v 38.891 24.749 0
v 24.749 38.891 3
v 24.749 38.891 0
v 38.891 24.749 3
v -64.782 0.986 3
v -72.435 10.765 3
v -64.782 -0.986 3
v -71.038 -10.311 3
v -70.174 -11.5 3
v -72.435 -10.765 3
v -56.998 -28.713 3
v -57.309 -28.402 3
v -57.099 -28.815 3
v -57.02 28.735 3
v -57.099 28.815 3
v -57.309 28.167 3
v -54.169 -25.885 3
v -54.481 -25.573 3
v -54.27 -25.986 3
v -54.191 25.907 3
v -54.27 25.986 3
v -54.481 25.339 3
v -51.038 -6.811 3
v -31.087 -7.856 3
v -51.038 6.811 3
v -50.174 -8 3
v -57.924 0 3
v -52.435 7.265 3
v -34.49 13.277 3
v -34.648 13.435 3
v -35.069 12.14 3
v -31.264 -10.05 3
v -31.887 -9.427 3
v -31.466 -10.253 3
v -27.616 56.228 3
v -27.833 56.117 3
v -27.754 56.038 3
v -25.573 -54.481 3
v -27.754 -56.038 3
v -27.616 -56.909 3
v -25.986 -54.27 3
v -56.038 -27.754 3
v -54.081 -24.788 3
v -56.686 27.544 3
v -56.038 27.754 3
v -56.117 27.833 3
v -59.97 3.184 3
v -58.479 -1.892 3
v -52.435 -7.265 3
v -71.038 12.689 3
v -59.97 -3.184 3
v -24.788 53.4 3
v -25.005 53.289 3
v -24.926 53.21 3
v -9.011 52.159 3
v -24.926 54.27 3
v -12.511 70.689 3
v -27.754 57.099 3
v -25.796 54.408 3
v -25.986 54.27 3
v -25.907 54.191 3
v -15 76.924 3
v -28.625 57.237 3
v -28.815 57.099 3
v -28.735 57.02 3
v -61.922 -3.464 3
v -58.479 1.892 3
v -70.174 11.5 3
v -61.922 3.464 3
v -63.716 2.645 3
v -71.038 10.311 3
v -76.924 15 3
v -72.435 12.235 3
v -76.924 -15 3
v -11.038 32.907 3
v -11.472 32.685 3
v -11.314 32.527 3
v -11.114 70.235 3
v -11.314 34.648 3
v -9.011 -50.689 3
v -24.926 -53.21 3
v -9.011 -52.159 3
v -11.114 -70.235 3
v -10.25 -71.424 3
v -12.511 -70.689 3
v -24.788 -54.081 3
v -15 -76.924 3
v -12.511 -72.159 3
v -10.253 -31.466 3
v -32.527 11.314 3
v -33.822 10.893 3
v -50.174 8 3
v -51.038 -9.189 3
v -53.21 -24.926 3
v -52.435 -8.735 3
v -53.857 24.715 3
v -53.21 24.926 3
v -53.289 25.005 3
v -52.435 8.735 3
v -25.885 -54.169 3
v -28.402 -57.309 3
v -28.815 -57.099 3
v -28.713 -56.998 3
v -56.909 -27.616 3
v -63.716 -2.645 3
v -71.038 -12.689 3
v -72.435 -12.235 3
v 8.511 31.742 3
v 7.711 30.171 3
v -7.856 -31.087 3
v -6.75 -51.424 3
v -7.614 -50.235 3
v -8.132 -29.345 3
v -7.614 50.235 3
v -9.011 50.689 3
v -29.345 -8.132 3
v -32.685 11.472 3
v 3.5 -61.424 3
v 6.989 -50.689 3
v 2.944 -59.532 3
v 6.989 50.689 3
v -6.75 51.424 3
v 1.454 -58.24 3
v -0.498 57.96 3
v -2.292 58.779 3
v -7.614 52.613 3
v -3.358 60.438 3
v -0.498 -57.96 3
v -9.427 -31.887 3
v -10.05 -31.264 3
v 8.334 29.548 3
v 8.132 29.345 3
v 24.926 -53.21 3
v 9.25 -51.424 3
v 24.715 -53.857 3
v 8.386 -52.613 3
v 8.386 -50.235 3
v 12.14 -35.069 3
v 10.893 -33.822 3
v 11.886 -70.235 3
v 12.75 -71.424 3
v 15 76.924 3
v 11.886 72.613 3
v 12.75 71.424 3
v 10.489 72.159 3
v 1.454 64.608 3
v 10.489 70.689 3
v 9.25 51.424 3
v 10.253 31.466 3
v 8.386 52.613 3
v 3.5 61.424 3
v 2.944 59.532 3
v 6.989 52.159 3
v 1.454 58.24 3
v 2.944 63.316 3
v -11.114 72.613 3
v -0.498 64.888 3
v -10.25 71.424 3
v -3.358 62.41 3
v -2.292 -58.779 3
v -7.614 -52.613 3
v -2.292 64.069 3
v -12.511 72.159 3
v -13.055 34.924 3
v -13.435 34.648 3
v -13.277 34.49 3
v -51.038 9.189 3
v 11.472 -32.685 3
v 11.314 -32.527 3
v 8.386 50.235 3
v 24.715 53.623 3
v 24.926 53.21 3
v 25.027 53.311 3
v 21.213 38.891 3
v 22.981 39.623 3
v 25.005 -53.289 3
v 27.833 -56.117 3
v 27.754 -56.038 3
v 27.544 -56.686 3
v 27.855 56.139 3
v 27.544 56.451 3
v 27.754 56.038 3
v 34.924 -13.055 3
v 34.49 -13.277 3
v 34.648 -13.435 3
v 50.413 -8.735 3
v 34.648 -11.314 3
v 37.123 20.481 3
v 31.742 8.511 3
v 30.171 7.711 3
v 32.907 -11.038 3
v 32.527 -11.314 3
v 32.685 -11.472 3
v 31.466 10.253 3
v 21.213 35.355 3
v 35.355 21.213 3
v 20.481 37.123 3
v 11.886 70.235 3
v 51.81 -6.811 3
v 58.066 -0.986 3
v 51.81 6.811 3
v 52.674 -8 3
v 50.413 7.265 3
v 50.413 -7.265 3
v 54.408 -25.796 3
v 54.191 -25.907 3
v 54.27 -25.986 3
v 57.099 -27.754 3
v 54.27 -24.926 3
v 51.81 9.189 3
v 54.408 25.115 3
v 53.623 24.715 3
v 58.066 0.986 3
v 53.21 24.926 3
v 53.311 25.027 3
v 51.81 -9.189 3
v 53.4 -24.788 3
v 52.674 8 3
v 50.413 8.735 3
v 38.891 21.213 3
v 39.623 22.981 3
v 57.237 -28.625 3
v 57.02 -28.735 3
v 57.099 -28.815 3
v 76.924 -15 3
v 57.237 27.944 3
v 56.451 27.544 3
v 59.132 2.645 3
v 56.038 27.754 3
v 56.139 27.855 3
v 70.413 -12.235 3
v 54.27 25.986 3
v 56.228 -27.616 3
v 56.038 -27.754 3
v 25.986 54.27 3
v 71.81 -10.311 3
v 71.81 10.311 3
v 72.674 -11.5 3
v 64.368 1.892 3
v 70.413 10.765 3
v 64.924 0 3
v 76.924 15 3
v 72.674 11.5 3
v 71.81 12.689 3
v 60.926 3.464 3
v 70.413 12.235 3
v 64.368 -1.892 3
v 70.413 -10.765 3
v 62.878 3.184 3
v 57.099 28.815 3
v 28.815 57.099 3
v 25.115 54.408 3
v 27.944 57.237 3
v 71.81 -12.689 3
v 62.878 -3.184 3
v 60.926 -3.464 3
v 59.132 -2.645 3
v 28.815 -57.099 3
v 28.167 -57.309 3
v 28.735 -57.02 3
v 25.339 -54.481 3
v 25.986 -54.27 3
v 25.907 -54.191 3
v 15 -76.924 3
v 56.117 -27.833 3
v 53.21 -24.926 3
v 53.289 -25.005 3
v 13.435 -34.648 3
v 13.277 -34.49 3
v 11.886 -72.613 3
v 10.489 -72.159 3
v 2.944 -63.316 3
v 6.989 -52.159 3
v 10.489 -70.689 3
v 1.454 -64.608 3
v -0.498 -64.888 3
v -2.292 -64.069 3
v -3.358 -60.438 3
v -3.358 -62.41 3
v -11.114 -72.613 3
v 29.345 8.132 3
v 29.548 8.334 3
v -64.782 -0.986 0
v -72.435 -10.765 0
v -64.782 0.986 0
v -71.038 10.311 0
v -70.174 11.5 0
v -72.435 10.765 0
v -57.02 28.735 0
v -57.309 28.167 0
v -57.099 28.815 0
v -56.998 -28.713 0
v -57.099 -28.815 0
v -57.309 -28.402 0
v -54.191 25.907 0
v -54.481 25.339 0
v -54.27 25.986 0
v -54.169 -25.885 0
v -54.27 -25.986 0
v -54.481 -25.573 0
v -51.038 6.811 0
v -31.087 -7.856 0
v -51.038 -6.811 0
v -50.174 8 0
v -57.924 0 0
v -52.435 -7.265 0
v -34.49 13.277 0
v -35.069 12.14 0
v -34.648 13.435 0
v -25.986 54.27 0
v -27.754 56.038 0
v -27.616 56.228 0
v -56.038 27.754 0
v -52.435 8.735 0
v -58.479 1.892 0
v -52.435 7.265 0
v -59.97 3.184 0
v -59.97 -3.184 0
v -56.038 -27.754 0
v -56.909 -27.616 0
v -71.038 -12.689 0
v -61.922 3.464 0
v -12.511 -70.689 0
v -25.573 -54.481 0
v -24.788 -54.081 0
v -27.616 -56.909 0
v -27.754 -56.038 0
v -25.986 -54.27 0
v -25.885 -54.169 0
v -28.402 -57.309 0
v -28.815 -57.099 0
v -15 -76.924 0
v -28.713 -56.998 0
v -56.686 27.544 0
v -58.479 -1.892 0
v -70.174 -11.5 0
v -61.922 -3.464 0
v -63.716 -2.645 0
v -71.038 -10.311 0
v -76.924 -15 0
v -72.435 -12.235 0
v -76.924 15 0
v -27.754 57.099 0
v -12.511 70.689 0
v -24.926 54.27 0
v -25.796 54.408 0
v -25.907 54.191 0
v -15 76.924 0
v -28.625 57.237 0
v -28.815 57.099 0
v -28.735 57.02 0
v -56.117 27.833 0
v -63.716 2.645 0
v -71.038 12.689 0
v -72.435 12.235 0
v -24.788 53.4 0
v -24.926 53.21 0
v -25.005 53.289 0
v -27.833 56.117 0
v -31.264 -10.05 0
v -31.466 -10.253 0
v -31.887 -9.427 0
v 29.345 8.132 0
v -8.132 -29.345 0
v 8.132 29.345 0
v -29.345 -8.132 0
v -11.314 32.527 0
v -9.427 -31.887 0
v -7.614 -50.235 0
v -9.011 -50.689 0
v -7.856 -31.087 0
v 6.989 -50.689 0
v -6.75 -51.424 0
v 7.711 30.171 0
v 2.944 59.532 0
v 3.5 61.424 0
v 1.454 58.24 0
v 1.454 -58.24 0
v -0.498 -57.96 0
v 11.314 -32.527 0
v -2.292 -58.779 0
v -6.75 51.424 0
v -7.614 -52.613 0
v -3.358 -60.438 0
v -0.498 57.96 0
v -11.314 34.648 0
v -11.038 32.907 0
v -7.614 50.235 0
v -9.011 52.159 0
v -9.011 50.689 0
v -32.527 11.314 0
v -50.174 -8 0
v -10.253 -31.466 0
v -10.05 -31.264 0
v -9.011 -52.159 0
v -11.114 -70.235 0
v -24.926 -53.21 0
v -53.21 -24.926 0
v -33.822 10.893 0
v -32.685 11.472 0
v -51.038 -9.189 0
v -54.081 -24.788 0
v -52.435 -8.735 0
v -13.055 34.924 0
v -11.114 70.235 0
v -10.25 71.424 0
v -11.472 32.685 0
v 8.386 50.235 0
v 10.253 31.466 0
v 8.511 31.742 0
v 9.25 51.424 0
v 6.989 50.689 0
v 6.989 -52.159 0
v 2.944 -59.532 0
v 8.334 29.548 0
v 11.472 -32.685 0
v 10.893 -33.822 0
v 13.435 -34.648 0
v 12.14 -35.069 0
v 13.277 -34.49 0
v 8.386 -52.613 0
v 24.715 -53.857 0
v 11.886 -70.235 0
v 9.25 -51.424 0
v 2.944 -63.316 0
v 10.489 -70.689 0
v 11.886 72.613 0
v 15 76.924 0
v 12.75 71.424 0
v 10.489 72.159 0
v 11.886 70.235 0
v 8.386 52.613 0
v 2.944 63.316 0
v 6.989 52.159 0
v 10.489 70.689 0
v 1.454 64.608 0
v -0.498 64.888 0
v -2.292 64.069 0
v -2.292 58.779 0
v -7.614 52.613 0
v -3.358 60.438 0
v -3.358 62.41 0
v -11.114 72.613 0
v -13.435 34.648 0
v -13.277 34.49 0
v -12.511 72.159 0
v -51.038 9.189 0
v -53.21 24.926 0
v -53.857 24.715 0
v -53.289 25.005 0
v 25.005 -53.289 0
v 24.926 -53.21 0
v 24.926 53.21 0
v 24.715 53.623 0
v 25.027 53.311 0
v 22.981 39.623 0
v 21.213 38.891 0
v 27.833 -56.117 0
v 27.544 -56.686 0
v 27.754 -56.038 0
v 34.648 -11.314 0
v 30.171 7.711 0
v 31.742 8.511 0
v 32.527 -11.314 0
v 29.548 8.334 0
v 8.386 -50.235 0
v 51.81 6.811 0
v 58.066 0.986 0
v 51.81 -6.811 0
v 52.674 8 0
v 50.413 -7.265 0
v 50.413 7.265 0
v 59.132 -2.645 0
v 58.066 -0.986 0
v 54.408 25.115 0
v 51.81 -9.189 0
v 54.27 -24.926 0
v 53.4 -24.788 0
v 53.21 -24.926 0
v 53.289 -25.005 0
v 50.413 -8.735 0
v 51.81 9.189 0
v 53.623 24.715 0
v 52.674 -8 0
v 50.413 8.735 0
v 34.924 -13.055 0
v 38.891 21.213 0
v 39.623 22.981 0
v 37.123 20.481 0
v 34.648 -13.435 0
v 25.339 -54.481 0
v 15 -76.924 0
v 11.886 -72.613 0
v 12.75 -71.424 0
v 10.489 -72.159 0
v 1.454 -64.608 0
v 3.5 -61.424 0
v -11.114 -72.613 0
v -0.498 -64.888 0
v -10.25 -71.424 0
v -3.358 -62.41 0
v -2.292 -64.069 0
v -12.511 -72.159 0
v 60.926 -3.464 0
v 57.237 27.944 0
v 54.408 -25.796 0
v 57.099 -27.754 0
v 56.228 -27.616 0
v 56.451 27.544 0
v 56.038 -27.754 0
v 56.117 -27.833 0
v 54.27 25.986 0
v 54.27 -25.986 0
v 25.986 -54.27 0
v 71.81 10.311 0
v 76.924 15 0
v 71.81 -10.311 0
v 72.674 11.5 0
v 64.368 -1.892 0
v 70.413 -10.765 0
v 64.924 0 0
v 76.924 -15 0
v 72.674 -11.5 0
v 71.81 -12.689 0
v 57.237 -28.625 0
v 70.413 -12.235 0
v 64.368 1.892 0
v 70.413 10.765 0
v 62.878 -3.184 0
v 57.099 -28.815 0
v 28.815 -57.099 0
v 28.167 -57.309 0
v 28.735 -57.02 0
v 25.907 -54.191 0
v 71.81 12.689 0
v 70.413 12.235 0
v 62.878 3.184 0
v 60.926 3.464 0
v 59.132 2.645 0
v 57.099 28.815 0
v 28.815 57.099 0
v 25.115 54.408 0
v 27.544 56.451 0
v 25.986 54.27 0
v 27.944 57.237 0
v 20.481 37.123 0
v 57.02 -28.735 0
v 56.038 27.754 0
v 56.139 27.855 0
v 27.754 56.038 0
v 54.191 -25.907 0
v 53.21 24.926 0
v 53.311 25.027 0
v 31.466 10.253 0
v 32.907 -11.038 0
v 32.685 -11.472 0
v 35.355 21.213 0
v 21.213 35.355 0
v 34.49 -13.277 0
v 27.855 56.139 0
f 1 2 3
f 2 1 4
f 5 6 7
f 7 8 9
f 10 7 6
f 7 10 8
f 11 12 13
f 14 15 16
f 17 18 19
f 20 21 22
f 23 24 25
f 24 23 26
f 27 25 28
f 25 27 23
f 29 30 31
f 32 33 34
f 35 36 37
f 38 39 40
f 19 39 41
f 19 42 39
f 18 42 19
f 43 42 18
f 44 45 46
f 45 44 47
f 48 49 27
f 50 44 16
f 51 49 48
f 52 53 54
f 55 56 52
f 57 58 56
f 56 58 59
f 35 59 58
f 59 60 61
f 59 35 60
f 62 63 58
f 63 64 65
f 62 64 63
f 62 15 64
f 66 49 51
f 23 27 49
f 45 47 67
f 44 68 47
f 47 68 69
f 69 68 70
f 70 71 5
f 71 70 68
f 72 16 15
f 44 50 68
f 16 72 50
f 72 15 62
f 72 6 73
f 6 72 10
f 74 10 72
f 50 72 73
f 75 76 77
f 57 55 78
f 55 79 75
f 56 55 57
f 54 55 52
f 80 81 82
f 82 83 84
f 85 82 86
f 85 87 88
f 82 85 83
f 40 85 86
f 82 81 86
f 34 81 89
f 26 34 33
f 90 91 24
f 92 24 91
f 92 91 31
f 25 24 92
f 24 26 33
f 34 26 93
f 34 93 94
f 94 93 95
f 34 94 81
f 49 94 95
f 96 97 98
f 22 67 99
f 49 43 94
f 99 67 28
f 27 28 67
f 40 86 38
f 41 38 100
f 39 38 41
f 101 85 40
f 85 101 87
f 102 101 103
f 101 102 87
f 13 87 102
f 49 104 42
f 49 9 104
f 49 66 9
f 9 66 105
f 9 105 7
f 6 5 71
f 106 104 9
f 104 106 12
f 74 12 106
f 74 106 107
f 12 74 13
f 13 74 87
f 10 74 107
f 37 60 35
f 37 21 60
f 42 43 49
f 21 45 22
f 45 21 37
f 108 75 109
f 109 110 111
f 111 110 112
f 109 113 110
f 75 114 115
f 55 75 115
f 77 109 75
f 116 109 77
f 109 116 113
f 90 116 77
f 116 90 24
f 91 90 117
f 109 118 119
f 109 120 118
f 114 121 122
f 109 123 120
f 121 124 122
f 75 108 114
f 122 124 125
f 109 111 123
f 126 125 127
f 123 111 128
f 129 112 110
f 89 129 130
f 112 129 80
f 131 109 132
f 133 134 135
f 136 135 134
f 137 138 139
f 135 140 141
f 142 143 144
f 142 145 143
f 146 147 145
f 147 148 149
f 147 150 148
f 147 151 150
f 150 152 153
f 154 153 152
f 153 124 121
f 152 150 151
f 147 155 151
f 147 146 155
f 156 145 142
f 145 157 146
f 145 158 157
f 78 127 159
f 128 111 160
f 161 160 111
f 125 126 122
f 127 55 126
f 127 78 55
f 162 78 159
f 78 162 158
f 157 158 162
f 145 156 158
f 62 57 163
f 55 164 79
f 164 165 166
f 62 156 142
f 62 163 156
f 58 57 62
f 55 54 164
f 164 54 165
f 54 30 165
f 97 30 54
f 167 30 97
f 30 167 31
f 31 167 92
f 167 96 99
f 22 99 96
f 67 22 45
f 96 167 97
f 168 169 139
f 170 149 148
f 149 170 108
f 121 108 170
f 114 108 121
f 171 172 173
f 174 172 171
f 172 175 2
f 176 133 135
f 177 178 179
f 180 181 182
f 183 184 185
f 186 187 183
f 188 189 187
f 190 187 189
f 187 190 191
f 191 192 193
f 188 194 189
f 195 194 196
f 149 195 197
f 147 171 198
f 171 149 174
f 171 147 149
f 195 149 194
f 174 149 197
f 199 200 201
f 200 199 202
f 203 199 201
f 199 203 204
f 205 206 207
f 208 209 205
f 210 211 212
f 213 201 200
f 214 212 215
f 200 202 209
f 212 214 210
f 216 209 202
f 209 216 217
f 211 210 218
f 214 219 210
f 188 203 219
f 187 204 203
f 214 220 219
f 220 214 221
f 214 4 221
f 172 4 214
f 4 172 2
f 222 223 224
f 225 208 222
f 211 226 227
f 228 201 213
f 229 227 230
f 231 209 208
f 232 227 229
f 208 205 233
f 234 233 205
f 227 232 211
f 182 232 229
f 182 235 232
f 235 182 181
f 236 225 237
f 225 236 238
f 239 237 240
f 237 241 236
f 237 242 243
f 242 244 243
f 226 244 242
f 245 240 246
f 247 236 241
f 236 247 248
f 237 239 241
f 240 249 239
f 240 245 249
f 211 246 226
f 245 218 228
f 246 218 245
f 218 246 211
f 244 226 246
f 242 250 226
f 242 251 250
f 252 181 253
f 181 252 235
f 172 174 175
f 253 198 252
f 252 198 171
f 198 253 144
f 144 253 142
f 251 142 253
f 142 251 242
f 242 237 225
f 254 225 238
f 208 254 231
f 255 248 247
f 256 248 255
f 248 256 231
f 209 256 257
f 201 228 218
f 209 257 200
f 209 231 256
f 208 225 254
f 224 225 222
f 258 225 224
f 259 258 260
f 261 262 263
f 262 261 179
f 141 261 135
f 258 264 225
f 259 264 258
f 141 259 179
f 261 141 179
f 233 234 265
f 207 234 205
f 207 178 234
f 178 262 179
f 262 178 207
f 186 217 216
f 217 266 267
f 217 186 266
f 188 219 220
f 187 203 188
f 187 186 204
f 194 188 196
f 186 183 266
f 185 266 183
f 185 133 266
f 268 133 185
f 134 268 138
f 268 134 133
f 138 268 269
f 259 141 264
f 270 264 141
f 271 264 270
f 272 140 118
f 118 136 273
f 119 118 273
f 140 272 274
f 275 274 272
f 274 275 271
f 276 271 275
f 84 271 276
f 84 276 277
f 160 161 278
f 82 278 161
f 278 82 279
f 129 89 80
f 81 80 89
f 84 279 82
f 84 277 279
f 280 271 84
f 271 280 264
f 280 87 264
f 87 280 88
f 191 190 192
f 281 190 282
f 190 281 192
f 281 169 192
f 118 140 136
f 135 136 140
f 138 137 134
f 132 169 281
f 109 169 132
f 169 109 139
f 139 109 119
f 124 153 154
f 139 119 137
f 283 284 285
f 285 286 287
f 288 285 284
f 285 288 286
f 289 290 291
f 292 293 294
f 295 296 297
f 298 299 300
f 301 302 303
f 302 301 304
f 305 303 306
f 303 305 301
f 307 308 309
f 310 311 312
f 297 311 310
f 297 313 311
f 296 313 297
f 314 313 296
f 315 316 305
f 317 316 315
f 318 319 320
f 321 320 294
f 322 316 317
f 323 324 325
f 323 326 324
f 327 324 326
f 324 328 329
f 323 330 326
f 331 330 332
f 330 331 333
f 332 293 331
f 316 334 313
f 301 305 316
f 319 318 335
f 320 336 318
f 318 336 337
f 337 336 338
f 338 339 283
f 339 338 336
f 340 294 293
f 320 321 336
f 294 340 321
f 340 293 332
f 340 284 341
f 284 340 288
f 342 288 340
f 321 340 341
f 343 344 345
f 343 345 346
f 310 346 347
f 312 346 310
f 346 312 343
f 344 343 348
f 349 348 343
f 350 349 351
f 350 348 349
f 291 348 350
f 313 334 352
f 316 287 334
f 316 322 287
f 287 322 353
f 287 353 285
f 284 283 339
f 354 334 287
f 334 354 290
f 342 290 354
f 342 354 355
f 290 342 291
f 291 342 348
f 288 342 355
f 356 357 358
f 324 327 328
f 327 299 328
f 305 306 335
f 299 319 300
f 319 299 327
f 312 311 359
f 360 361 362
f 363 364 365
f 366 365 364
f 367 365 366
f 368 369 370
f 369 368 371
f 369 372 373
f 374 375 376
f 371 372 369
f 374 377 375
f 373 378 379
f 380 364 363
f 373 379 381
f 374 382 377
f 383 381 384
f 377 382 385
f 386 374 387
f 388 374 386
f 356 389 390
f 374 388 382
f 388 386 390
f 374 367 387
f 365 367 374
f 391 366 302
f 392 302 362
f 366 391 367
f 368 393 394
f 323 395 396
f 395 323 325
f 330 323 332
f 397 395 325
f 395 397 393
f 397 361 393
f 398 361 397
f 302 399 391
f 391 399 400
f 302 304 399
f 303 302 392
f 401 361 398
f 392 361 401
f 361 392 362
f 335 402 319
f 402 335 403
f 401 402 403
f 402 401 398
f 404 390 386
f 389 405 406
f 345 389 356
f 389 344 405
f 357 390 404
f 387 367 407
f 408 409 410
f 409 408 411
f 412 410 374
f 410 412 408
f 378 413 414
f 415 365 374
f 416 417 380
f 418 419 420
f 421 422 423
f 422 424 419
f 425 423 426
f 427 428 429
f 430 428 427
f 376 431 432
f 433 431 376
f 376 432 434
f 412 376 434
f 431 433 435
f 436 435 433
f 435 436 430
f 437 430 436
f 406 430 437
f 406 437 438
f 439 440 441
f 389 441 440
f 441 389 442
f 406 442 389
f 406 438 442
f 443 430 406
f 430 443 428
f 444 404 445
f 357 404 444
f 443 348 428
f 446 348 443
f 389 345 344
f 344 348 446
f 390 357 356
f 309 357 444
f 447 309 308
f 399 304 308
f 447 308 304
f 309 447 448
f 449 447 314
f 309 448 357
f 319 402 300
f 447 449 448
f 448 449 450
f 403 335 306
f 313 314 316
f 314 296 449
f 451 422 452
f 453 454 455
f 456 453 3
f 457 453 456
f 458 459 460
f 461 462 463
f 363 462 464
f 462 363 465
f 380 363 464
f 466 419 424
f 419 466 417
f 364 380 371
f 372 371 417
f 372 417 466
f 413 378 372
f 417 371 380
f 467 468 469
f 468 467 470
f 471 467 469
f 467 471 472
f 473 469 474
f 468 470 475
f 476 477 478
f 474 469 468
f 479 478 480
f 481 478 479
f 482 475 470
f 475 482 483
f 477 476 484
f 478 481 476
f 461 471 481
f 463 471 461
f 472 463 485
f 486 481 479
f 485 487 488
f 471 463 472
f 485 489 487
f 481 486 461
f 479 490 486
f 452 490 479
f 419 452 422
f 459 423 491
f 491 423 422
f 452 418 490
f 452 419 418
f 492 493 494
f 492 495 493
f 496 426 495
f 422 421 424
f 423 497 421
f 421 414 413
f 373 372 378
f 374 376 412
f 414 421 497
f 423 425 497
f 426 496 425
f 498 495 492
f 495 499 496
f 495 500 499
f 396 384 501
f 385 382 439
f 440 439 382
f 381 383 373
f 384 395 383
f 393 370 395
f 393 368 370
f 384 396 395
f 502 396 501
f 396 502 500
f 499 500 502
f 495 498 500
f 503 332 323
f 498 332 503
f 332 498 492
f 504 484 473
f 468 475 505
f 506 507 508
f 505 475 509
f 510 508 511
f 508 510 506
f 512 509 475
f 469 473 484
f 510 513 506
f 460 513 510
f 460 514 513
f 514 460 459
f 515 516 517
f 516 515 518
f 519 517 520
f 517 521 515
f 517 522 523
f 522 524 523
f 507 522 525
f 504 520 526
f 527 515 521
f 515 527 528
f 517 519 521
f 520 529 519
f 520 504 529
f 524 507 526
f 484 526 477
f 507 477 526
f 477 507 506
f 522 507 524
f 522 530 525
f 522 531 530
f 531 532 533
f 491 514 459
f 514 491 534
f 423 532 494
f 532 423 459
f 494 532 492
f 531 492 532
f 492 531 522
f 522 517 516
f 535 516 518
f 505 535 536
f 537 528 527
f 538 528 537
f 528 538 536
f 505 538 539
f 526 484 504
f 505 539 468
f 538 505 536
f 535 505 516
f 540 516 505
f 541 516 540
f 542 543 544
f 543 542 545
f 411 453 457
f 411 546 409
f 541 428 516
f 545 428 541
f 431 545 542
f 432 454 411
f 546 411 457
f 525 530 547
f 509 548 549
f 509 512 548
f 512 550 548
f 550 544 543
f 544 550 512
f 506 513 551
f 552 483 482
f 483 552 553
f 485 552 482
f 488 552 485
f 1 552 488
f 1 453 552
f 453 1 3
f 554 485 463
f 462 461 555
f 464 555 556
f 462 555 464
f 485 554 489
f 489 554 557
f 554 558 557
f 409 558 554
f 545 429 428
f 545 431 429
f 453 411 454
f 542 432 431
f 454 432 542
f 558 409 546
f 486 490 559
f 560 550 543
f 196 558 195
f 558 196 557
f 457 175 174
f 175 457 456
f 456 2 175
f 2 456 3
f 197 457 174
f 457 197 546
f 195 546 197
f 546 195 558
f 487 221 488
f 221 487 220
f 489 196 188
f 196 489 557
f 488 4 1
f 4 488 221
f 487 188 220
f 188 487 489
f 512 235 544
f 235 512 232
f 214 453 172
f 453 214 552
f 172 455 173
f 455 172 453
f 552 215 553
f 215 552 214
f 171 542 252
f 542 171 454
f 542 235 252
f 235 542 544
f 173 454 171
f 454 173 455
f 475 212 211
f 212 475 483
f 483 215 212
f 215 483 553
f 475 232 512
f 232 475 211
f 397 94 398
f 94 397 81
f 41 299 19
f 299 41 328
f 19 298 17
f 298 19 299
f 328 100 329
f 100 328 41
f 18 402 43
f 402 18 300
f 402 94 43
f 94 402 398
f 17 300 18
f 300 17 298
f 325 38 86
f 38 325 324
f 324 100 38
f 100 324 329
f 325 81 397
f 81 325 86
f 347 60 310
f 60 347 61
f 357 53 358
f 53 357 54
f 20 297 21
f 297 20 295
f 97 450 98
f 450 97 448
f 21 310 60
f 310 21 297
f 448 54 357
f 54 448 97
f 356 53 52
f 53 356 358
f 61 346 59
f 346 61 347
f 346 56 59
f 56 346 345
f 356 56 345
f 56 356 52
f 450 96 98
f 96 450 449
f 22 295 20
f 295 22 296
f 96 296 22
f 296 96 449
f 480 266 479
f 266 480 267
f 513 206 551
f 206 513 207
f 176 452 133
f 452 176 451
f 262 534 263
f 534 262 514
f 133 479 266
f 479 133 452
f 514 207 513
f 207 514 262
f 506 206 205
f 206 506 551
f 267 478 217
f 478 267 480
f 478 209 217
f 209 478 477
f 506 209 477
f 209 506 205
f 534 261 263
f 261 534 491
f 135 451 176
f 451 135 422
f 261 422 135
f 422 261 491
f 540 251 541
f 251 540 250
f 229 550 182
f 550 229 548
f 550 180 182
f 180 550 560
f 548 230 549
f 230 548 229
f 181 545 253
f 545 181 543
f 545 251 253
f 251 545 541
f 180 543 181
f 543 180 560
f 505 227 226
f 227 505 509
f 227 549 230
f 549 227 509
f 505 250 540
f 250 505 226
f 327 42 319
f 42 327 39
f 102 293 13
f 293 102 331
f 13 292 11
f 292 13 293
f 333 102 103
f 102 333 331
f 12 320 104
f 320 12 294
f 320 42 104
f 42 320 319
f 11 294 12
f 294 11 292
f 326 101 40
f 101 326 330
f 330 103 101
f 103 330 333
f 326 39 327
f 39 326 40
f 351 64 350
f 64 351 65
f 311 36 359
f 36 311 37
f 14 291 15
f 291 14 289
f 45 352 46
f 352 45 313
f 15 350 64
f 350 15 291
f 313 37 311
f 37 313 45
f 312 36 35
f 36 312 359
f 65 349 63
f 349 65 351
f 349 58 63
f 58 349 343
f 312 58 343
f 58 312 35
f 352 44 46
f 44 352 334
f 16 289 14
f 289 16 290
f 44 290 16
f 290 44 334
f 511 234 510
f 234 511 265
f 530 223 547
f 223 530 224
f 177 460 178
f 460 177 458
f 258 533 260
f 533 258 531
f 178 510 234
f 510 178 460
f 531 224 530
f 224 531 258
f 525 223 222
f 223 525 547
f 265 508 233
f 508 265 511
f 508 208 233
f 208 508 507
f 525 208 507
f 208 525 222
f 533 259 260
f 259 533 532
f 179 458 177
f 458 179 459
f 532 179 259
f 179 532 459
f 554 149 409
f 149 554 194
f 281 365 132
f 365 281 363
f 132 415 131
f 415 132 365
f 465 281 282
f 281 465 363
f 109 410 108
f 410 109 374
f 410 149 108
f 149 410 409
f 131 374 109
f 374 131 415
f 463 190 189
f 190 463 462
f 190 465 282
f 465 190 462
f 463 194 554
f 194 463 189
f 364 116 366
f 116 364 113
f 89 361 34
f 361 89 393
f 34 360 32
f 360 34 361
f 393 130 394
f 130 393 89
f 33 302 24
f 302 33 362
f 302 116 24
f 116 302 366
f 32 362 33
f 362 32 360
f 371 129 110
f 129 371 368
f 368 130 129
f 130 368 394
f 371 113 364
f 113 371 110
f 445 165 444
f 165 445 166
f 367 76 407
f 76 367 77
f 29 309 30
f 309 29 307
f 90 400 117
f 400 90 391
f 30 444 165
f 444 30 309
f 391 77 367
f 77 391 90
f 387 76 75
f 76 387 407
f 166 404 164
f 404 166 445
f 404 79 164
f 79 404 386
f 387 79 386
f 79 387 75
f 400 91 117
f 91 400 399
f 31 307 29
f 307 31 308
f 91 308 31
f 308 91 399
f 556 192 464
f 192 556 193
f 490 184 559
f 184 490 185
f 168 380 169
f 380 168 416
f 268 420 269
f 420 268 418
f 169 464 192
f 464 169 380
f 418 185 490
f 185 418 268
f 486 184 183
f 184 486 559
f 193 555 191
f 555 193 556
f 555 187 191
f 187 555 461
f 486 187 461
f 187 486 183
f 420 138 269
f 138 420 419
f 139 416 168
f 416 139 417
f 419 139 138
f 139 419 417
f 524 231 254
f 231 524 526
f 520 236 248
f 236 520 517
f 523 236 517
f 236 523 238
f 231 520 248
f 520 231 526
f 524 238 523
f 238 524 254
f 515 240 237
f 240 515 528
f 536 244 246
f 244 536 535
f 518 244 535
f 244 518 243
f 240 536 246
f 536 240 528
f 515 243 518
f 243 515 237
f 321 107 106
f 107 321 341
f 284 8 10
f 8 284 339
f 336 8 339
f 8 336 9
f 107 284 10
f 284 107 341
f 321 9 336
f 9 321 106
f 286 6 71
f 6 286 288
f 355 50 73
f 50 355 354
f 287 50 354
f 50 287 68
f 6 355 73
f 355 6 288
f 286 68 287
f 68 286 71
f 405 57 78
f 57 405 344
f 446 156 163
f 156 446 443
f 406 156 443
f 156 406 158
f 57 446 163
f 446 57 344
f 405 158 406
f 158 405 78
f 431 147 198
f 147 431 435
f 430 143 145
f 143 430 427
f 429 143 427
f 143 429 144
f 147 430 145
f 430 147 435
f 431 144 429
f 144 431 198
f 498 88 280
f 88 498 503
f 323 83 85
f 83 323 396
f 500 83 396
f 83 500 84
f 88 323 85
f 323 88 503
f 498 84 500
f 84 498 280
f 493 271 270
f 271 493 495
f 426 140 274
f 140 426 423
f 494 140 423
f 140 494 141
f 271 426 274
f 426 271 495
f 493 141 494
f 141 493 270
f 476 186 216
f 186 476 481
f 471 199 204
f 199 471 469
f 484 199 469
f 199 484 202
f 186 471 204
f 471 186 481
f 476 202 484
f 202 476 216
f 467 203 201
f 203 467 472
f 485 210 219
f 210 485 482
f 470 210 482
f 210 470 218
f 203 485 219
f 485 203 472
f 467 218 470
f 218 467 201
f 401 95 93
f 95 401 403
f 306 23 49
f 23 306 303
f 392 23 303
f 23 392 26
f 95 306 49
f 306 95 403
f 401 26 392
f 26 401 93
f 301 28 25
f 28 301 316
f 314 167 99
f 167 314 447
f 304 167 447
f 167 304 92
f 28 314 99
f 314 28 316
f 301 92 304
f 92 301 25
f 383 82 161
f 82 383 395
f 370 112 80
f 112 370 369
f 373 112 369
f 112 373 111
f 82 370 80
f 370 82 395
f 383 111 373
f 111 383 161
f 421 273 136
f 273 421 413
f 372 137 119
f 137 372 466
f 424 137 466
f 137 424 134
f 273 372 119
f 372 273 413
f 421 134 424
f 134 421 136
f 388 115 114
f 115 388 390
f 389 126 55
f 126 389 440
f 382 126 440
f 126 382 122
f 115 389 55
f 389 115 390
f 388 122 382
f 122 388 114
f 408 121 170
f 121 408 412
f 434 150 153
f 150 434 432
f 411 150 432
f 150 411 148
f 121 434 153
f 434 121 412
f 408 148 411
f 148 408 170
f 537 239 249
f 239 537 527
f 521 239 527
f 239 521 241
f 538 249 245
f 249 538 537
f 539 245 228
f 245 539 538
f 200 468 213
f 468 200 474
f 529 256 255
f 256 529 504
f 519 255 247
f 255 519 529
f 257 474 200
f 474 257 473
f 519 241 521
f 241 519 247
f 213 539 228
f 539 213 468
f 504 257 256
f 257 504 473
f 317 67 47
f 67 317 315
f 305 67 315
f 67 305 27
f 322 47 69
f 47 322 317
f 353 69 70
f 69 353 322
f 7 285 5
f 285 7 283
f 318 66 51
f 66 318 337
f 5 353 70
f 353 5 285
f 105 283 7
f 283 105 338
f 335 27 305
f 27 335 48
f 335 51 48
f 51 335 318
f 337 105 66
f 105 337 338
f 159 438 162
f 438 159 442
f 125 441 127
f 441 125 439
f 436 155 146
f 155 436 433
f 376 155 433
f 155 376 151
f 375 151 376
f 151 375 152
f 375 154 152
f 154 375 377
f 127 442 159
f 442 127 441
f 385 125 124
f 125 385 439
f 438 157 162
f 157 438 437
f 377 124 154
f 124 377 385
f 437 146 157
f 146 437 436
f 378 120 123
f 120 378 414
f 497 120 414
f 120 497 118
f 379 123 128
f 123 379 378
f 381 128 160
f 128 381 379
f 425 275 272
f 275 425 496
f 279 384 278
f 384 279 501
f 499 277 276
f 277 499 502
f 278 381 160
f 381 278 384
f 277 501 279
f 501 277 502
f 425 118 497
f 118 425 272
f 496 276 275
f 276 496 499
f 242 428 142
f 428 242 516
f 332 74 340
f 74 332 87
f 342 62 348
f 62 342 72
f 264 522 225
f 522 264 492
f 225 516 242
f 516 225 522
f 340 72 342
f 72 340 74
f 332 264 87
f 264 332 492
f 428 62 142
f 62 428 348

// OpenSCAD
// file: common.scad
module M25Hole(x, y, z, depth) {
    translate([x, y, z]) {
        cylinder(h = depth, d = 2.5, center = true);
    }
}

module M6Hole(x, y, z, depth) {
    translate([x, y, z]) {
        cylinder(h = depth, d = 7.0, center = true);
    }
}

module OdroidXU4MountHoles(plate_depth) {
    depth = 76;
    width = 52;

    rotate(45) {
        M25Hole(depth / 2.0, width / 2.0, 0.0, plate_depth * 2);
        M25Hole(-depth / 2.0, width / 2.0, 0.0, plate_depth * 2);
        M25Hole(depth / 2.0, -width / 2.0, 0.0, plate_depth * 2);
        M25Hole(-depth / 2.0, -width / 2.0, 0.0, plate_depth * 2);
    }
}

module StackHoles(plate_width, plate_depth, plate_diagonal) {
    between_line = 20.0;

    E = 5.5;
    F = (plate_diagonal / 2.0) - E;
    H = F - (between_line / 2.0);

    M6Hole(H, 0.0, plate_depth / 2.0, plate_depth);
    M6Hole(-H, 0.0, plate_depth / 2.0, plate_depth);
    M6Hole(0.0, H, plate_depth / 2.0, plate_depth);
    M6Hole(0.0, -H, plate_depth / 2.0, plate_depth);
}
// main file
include <common.scad>;

// plate parameters
plate_width = 130.0;
plate_depth = 3.0;


module CableRoutingHoles(plate_width, plate_depth) {
  routing_width = plate_width - 45.0;
  hole_width = 20;
  hole_length = 5;

  // inner cable fastening holes
  translate([routing_width / 2.0, 0.0, plate_depth / 2.0]) {
    cube(size=[hole_length, hole_width, plate_depth], center=true);
    translate([0.0, hole_width / 2.0, -plate_depth / 2.0]) {
      cylinder(r=hole_length / 2.0, h=plate_depth, center=false);
    }
    translate([0.0, -hole_width / 2.0, -plate_depth / 2.0]) {
      cylinder(r=hole_length / 2.0, h=plate_depth, center=false);
    }
  }
}

module CableFasteningHoles(plate_width, plate_depth) {
  inner_width = plate_width - 18.0;
  outer_width = plate_width - 10.0;
  hole_width = 40;
  hole_length = 1.5;

  // inner cable fastening holes
  translate([inner_width / 2.0, 0.0, plate_depth / 2.0]) {
    cube(size=[hole_length, hole_width, plate_depth], center=true);
    translate([0.0, hole_width / 2.0, -plate_depth / 2.0]) {
      cylinder(r=hole_length / 2.0, h=plate_depth, center=false);
    }
    translate([0.0, -hole_width / 2.0, -plate_depth / 2.0]) {
      cylinder(r=hole_length / 2.0, h=plate_depth, center=false);
    }
  }

  translate([-inner_width / 2.0, 0.0, plate_depth / 2.0]) {
    cube(size=[hole_length, hole_width, plate_depth], center=true);
    translate([0.0, hole_width / 2.0, -plate_depth / 2.0]) {
      cylinder(r=hole_length / 2.0, h=plate_depth, center=false);
    }
    translate([0.0, -hole_width / 2.0, -plate_depth / 2.0]) {
      cylinder(r=hole_length / 2.0, h=plate_depth, center=false);
    }
  }

  translate([0.0, inner_width / 2.0, plate_depth / 2.0]) {
    cube(size=[hole_width, hole_length, plate_depth], center=true);
    translate([hole_width / 2.0, 0.0, -plate_depth / 2.0]) {
      cylinder(r=hole_length / 2.0, h=plate_depth, center=false);
    }
    translate([-hole_width / 2.0, 0.0, -plate_depth / 2.0]) {
      cylinder(r=hole_length / 2.0, h=plate_depth, center=false);
    }
  }

  translate([0.0, -inner_width / 2.0, plate_depth / 2.0]) {
    cube(size=[hole_width, hole_length, plate_depth], center=true);
    translate([hole_width / 2.0, 0.0, -plate_depth / 2.0]) {
      cylinder(r=hole_length / 2.0, h=plate_depth, center=false);
    }
    translate([-hole_width / 2.0, 0.0, -plate_depth / 2.0]) {
      cylinder(r=hole_length / 2.0, h=plate_depth, center=false);
    }
  }

  // outer cable fastening holes
  translate([outer_width / 2.0, 0.0, plate_depth / 2.0]) {
    cube(size=[hole_length, hole_width, plate_depth], center=true);
    translate([0.0, hole_width / 2.0, -plate_depth / 2.0]) {
      cylinder(r=hole_length / 2.0, h=plate_depth, center=false);
    }
    translate([0.0, -hole_width / 2.0, -plate_depth / 2.0]) {
      cylinder(r=hole_length / 2.0, h=plate_depth, center=false);
    }
  }

  translate([-outer_width / 2.0, 0.0, plate_depth / 2.0]) {
    cube(size=[hole_length, hole_width, plate_depth], center=true);
    translate([0.0, hole_width / 2.0, -plate_depth / 2.0]) {
      cylinder(r=hole_length / 2.0, h=plate_depth, center=false);
    }
    translate([0.0, -hole_width / 2.0, -plate_depth / 2.0]) {
      cylinder(r=hole_length / 2.0, h=plate_depth, center=false);
    }
  }

  translate([0.0, outer_width / 2.0, plate_depth / 2.0]) {
    cube(size=[hole_width, hole_length, plate_depth], center=true);
    translate([hole_width / 2.0, 0.0, -plate_depth / 2.0]) {
      cylinder(r=hole_length / 2.0, h=plate_depth, center=false);
    }
    translate([-hole_width / 2.0, 0.0, -plate_depth / 2.0]) {
      cylinder(r=hole_length / 2.0, h=plate_depth, center=false);
    }
  }

  translate([0.0, -outer_width / 2.0, plate_depth / 2.0]) {
    cube(size=[hole_width, hole_length, plate_depth], center=true);
    translate([hole_width / 2.0, 0.0, -plate_depth / 2.0]) {
      cylinder(r=hole_length / 2.0, h=plate_depth, center=false);
    }
    translate([-hole_width / 2.0, 0.0, -plate_depth / 2.0]) {
      cylinder(r=hole_length / 2.0, h=plate_depth, center=false);
    }
  }
}

module ESCMountHoles(plate_depth) {
  esc_width = 56;
  esc_length = 65;
  hole_width = 30;
  hole_length = 3;

  translate([esc_width / 2.0, 0.0, plate_depth / 2.0]) {
    cube(size=[hole_length, hole_width, plate_depth], center=true);
    translate([0.0, hole_width / 2.0, -plate_depth / 2.0]) {
      cylinder(r=hole_length / 2.0, h=plate_depth, center=false);
    }
    translate([0.0, -hole_width / 2.0, -plate_depth / 2.0]) {
      cylinder(r=hole_length / 2.0, h=plate_depth, center=false);
    }
  }

  translate([-esc_width / 2.0, 0.0, plate_depth / 2.0]) {
    cube(size=[hole_length, hole_width, plate_depth], center=true);
    translate([0.0, hole_width / 2.0, -plate_depth / 2.0]) {
      cylinder(r=hole_length / 2.0, h=plate_depth, center=false);
    }
    translate([0.0, -hole_width / 2.0, -plate_depth / 2.0]) {
      cylinder(r=hole_length / 2.0, h=plate_depth, center=false);
    }
  }

  translate([0.0, esc_length / 2.0, plate_depth / 2.0]) {
    cube(size=[hole_width, hole_length, plate_depth], center=true);
    translate([hole_width / 2.0, 0.0, -plate_depth / 2.0]) {
      cylinder(r=hole_length / 2.0, h=plate_depth, center=false);
    }
    translate([-hole_width / 2.0, 0.0, -plate_depth / 2.0]) {
      cylinder(r=hole_length / 2.0, h=plate_depth, center=false);
    }
  }

  translate([0.0, -esc_length / 2.0, plate_depth / 2.0]) {
    cube(size=[hole_width, hole_length, plate_depth], center=true);
    translate([hole_width / 2.0, 0.0, -plate_depth / 2.0]) {
      cylinder(r=hole_length / 2.0, h=plate_depth, center=false);
    }
    translate([-hole_width / 2.0, 0.0, -plate_depth / 2.0]) {
      cylinder(r=hole_length / 2.0, h=plate_depth, center=false);
    }
  }
}

module ArmScrewHoles(plate_width, plate_depth, plate_diagonal) {
  base_line = 23.0;
  top_line = 16.0;
  between_line = 20.0;

  E = 5.5;
  F = (plate_diagonal / 2.0) - E;
  G = F - between_line;

  // outer screw holes
  M25Hole(F, -base_line / 2.0, plate_depth / 2.0, plate_depth);
  M25Hole(F, base_line / 2.0, plate_depth / 2.0, plate_depth);

  M25Hole(-F, -base_line / 2.0, plate_depth / 2.0, plate_depth);
  M25Hole(-F, base_line / 2.0, plate_depth / 2.0, plate_depth);

  M25Hole(-base_line / 2.0, F, plate_depth / 2.0, plate_depth);
  M25Hole(base_line / 2.0, F, plate_depth / 2.0, plate_depth);

  M25Hole(-base_line / 2.0, -F, plate_depth / 2.0, plate_depth);
  M25Hole(base_line / 2.0, -F, plate_depth / 2.0, plate_depth);

  // inner screw holes
  M25Hole(G, -top_line / 2, plate_depth / 2.0, plate_depth);
  M25Hole(G, top_line / 2, plate_depth / 2.0, plate_depth);

  M25Hole(-G, -top_line / 2, plate_depth / 2.0, plate_depth);
  M25Hole(-G, top_line / 2, plate_depth / 2.0, plate_depth);

  M25Hole(-top_line / 2, -G, plate_depth / 2.0, plate_depth);
  M25Hole(top_line / 2, -G, plate_depth / 2.0, plate_depth);

  M25Hole(-top_line / 2, G, plate_depth / 2.0, plate_depth);
  M25Hole(top_line / 2, G, plate_depth / 2.0, plate_depth);
}

module TopPlate(plate_width, plate_depth) {
  difference() {
    // plate
    rotate(45) {
      translate([-plate_width / 2.0, -plate_width / 2.0, 0.0]) {
        cube([plate_width, plate_width, plate_depth]);
      }
    }

    // square cut plate corners
    A = plate_width;
    B = sqrt(2 * pow(A, 2));
    C = 30.0;
    D = 30.0;

    translate([B / 2.0, 0.0, plate_depth / 2.0]) cube([C, D, plate_depth], true);
    translate([-B / 2.0, 0.0, plate_depth / 2.0]) cube([C, D, plate_depth], true);
    translate([0.0, -B / 2.0, plate_depth / 2.0]) cube([D, C, plate_depth], true);
    translate([0.0, B/ 2.0, plate_depth / 2.0]) cube([D, C, plate_depth], true);

    // holes
    rotate(45) {
      CableRoutingHoles(plate_width, plate_depth);
      CableFasteningHoles(plate_width, plate_depth);
      ESCMountHoles(plate_depth);
    }
    ArmScrewHoles(plate_width, plate_depth, B - C);
    StackHoles(plate_width, plate_depth, B - C);
  }
}

TopPlate(plate_width, plate_depth);
